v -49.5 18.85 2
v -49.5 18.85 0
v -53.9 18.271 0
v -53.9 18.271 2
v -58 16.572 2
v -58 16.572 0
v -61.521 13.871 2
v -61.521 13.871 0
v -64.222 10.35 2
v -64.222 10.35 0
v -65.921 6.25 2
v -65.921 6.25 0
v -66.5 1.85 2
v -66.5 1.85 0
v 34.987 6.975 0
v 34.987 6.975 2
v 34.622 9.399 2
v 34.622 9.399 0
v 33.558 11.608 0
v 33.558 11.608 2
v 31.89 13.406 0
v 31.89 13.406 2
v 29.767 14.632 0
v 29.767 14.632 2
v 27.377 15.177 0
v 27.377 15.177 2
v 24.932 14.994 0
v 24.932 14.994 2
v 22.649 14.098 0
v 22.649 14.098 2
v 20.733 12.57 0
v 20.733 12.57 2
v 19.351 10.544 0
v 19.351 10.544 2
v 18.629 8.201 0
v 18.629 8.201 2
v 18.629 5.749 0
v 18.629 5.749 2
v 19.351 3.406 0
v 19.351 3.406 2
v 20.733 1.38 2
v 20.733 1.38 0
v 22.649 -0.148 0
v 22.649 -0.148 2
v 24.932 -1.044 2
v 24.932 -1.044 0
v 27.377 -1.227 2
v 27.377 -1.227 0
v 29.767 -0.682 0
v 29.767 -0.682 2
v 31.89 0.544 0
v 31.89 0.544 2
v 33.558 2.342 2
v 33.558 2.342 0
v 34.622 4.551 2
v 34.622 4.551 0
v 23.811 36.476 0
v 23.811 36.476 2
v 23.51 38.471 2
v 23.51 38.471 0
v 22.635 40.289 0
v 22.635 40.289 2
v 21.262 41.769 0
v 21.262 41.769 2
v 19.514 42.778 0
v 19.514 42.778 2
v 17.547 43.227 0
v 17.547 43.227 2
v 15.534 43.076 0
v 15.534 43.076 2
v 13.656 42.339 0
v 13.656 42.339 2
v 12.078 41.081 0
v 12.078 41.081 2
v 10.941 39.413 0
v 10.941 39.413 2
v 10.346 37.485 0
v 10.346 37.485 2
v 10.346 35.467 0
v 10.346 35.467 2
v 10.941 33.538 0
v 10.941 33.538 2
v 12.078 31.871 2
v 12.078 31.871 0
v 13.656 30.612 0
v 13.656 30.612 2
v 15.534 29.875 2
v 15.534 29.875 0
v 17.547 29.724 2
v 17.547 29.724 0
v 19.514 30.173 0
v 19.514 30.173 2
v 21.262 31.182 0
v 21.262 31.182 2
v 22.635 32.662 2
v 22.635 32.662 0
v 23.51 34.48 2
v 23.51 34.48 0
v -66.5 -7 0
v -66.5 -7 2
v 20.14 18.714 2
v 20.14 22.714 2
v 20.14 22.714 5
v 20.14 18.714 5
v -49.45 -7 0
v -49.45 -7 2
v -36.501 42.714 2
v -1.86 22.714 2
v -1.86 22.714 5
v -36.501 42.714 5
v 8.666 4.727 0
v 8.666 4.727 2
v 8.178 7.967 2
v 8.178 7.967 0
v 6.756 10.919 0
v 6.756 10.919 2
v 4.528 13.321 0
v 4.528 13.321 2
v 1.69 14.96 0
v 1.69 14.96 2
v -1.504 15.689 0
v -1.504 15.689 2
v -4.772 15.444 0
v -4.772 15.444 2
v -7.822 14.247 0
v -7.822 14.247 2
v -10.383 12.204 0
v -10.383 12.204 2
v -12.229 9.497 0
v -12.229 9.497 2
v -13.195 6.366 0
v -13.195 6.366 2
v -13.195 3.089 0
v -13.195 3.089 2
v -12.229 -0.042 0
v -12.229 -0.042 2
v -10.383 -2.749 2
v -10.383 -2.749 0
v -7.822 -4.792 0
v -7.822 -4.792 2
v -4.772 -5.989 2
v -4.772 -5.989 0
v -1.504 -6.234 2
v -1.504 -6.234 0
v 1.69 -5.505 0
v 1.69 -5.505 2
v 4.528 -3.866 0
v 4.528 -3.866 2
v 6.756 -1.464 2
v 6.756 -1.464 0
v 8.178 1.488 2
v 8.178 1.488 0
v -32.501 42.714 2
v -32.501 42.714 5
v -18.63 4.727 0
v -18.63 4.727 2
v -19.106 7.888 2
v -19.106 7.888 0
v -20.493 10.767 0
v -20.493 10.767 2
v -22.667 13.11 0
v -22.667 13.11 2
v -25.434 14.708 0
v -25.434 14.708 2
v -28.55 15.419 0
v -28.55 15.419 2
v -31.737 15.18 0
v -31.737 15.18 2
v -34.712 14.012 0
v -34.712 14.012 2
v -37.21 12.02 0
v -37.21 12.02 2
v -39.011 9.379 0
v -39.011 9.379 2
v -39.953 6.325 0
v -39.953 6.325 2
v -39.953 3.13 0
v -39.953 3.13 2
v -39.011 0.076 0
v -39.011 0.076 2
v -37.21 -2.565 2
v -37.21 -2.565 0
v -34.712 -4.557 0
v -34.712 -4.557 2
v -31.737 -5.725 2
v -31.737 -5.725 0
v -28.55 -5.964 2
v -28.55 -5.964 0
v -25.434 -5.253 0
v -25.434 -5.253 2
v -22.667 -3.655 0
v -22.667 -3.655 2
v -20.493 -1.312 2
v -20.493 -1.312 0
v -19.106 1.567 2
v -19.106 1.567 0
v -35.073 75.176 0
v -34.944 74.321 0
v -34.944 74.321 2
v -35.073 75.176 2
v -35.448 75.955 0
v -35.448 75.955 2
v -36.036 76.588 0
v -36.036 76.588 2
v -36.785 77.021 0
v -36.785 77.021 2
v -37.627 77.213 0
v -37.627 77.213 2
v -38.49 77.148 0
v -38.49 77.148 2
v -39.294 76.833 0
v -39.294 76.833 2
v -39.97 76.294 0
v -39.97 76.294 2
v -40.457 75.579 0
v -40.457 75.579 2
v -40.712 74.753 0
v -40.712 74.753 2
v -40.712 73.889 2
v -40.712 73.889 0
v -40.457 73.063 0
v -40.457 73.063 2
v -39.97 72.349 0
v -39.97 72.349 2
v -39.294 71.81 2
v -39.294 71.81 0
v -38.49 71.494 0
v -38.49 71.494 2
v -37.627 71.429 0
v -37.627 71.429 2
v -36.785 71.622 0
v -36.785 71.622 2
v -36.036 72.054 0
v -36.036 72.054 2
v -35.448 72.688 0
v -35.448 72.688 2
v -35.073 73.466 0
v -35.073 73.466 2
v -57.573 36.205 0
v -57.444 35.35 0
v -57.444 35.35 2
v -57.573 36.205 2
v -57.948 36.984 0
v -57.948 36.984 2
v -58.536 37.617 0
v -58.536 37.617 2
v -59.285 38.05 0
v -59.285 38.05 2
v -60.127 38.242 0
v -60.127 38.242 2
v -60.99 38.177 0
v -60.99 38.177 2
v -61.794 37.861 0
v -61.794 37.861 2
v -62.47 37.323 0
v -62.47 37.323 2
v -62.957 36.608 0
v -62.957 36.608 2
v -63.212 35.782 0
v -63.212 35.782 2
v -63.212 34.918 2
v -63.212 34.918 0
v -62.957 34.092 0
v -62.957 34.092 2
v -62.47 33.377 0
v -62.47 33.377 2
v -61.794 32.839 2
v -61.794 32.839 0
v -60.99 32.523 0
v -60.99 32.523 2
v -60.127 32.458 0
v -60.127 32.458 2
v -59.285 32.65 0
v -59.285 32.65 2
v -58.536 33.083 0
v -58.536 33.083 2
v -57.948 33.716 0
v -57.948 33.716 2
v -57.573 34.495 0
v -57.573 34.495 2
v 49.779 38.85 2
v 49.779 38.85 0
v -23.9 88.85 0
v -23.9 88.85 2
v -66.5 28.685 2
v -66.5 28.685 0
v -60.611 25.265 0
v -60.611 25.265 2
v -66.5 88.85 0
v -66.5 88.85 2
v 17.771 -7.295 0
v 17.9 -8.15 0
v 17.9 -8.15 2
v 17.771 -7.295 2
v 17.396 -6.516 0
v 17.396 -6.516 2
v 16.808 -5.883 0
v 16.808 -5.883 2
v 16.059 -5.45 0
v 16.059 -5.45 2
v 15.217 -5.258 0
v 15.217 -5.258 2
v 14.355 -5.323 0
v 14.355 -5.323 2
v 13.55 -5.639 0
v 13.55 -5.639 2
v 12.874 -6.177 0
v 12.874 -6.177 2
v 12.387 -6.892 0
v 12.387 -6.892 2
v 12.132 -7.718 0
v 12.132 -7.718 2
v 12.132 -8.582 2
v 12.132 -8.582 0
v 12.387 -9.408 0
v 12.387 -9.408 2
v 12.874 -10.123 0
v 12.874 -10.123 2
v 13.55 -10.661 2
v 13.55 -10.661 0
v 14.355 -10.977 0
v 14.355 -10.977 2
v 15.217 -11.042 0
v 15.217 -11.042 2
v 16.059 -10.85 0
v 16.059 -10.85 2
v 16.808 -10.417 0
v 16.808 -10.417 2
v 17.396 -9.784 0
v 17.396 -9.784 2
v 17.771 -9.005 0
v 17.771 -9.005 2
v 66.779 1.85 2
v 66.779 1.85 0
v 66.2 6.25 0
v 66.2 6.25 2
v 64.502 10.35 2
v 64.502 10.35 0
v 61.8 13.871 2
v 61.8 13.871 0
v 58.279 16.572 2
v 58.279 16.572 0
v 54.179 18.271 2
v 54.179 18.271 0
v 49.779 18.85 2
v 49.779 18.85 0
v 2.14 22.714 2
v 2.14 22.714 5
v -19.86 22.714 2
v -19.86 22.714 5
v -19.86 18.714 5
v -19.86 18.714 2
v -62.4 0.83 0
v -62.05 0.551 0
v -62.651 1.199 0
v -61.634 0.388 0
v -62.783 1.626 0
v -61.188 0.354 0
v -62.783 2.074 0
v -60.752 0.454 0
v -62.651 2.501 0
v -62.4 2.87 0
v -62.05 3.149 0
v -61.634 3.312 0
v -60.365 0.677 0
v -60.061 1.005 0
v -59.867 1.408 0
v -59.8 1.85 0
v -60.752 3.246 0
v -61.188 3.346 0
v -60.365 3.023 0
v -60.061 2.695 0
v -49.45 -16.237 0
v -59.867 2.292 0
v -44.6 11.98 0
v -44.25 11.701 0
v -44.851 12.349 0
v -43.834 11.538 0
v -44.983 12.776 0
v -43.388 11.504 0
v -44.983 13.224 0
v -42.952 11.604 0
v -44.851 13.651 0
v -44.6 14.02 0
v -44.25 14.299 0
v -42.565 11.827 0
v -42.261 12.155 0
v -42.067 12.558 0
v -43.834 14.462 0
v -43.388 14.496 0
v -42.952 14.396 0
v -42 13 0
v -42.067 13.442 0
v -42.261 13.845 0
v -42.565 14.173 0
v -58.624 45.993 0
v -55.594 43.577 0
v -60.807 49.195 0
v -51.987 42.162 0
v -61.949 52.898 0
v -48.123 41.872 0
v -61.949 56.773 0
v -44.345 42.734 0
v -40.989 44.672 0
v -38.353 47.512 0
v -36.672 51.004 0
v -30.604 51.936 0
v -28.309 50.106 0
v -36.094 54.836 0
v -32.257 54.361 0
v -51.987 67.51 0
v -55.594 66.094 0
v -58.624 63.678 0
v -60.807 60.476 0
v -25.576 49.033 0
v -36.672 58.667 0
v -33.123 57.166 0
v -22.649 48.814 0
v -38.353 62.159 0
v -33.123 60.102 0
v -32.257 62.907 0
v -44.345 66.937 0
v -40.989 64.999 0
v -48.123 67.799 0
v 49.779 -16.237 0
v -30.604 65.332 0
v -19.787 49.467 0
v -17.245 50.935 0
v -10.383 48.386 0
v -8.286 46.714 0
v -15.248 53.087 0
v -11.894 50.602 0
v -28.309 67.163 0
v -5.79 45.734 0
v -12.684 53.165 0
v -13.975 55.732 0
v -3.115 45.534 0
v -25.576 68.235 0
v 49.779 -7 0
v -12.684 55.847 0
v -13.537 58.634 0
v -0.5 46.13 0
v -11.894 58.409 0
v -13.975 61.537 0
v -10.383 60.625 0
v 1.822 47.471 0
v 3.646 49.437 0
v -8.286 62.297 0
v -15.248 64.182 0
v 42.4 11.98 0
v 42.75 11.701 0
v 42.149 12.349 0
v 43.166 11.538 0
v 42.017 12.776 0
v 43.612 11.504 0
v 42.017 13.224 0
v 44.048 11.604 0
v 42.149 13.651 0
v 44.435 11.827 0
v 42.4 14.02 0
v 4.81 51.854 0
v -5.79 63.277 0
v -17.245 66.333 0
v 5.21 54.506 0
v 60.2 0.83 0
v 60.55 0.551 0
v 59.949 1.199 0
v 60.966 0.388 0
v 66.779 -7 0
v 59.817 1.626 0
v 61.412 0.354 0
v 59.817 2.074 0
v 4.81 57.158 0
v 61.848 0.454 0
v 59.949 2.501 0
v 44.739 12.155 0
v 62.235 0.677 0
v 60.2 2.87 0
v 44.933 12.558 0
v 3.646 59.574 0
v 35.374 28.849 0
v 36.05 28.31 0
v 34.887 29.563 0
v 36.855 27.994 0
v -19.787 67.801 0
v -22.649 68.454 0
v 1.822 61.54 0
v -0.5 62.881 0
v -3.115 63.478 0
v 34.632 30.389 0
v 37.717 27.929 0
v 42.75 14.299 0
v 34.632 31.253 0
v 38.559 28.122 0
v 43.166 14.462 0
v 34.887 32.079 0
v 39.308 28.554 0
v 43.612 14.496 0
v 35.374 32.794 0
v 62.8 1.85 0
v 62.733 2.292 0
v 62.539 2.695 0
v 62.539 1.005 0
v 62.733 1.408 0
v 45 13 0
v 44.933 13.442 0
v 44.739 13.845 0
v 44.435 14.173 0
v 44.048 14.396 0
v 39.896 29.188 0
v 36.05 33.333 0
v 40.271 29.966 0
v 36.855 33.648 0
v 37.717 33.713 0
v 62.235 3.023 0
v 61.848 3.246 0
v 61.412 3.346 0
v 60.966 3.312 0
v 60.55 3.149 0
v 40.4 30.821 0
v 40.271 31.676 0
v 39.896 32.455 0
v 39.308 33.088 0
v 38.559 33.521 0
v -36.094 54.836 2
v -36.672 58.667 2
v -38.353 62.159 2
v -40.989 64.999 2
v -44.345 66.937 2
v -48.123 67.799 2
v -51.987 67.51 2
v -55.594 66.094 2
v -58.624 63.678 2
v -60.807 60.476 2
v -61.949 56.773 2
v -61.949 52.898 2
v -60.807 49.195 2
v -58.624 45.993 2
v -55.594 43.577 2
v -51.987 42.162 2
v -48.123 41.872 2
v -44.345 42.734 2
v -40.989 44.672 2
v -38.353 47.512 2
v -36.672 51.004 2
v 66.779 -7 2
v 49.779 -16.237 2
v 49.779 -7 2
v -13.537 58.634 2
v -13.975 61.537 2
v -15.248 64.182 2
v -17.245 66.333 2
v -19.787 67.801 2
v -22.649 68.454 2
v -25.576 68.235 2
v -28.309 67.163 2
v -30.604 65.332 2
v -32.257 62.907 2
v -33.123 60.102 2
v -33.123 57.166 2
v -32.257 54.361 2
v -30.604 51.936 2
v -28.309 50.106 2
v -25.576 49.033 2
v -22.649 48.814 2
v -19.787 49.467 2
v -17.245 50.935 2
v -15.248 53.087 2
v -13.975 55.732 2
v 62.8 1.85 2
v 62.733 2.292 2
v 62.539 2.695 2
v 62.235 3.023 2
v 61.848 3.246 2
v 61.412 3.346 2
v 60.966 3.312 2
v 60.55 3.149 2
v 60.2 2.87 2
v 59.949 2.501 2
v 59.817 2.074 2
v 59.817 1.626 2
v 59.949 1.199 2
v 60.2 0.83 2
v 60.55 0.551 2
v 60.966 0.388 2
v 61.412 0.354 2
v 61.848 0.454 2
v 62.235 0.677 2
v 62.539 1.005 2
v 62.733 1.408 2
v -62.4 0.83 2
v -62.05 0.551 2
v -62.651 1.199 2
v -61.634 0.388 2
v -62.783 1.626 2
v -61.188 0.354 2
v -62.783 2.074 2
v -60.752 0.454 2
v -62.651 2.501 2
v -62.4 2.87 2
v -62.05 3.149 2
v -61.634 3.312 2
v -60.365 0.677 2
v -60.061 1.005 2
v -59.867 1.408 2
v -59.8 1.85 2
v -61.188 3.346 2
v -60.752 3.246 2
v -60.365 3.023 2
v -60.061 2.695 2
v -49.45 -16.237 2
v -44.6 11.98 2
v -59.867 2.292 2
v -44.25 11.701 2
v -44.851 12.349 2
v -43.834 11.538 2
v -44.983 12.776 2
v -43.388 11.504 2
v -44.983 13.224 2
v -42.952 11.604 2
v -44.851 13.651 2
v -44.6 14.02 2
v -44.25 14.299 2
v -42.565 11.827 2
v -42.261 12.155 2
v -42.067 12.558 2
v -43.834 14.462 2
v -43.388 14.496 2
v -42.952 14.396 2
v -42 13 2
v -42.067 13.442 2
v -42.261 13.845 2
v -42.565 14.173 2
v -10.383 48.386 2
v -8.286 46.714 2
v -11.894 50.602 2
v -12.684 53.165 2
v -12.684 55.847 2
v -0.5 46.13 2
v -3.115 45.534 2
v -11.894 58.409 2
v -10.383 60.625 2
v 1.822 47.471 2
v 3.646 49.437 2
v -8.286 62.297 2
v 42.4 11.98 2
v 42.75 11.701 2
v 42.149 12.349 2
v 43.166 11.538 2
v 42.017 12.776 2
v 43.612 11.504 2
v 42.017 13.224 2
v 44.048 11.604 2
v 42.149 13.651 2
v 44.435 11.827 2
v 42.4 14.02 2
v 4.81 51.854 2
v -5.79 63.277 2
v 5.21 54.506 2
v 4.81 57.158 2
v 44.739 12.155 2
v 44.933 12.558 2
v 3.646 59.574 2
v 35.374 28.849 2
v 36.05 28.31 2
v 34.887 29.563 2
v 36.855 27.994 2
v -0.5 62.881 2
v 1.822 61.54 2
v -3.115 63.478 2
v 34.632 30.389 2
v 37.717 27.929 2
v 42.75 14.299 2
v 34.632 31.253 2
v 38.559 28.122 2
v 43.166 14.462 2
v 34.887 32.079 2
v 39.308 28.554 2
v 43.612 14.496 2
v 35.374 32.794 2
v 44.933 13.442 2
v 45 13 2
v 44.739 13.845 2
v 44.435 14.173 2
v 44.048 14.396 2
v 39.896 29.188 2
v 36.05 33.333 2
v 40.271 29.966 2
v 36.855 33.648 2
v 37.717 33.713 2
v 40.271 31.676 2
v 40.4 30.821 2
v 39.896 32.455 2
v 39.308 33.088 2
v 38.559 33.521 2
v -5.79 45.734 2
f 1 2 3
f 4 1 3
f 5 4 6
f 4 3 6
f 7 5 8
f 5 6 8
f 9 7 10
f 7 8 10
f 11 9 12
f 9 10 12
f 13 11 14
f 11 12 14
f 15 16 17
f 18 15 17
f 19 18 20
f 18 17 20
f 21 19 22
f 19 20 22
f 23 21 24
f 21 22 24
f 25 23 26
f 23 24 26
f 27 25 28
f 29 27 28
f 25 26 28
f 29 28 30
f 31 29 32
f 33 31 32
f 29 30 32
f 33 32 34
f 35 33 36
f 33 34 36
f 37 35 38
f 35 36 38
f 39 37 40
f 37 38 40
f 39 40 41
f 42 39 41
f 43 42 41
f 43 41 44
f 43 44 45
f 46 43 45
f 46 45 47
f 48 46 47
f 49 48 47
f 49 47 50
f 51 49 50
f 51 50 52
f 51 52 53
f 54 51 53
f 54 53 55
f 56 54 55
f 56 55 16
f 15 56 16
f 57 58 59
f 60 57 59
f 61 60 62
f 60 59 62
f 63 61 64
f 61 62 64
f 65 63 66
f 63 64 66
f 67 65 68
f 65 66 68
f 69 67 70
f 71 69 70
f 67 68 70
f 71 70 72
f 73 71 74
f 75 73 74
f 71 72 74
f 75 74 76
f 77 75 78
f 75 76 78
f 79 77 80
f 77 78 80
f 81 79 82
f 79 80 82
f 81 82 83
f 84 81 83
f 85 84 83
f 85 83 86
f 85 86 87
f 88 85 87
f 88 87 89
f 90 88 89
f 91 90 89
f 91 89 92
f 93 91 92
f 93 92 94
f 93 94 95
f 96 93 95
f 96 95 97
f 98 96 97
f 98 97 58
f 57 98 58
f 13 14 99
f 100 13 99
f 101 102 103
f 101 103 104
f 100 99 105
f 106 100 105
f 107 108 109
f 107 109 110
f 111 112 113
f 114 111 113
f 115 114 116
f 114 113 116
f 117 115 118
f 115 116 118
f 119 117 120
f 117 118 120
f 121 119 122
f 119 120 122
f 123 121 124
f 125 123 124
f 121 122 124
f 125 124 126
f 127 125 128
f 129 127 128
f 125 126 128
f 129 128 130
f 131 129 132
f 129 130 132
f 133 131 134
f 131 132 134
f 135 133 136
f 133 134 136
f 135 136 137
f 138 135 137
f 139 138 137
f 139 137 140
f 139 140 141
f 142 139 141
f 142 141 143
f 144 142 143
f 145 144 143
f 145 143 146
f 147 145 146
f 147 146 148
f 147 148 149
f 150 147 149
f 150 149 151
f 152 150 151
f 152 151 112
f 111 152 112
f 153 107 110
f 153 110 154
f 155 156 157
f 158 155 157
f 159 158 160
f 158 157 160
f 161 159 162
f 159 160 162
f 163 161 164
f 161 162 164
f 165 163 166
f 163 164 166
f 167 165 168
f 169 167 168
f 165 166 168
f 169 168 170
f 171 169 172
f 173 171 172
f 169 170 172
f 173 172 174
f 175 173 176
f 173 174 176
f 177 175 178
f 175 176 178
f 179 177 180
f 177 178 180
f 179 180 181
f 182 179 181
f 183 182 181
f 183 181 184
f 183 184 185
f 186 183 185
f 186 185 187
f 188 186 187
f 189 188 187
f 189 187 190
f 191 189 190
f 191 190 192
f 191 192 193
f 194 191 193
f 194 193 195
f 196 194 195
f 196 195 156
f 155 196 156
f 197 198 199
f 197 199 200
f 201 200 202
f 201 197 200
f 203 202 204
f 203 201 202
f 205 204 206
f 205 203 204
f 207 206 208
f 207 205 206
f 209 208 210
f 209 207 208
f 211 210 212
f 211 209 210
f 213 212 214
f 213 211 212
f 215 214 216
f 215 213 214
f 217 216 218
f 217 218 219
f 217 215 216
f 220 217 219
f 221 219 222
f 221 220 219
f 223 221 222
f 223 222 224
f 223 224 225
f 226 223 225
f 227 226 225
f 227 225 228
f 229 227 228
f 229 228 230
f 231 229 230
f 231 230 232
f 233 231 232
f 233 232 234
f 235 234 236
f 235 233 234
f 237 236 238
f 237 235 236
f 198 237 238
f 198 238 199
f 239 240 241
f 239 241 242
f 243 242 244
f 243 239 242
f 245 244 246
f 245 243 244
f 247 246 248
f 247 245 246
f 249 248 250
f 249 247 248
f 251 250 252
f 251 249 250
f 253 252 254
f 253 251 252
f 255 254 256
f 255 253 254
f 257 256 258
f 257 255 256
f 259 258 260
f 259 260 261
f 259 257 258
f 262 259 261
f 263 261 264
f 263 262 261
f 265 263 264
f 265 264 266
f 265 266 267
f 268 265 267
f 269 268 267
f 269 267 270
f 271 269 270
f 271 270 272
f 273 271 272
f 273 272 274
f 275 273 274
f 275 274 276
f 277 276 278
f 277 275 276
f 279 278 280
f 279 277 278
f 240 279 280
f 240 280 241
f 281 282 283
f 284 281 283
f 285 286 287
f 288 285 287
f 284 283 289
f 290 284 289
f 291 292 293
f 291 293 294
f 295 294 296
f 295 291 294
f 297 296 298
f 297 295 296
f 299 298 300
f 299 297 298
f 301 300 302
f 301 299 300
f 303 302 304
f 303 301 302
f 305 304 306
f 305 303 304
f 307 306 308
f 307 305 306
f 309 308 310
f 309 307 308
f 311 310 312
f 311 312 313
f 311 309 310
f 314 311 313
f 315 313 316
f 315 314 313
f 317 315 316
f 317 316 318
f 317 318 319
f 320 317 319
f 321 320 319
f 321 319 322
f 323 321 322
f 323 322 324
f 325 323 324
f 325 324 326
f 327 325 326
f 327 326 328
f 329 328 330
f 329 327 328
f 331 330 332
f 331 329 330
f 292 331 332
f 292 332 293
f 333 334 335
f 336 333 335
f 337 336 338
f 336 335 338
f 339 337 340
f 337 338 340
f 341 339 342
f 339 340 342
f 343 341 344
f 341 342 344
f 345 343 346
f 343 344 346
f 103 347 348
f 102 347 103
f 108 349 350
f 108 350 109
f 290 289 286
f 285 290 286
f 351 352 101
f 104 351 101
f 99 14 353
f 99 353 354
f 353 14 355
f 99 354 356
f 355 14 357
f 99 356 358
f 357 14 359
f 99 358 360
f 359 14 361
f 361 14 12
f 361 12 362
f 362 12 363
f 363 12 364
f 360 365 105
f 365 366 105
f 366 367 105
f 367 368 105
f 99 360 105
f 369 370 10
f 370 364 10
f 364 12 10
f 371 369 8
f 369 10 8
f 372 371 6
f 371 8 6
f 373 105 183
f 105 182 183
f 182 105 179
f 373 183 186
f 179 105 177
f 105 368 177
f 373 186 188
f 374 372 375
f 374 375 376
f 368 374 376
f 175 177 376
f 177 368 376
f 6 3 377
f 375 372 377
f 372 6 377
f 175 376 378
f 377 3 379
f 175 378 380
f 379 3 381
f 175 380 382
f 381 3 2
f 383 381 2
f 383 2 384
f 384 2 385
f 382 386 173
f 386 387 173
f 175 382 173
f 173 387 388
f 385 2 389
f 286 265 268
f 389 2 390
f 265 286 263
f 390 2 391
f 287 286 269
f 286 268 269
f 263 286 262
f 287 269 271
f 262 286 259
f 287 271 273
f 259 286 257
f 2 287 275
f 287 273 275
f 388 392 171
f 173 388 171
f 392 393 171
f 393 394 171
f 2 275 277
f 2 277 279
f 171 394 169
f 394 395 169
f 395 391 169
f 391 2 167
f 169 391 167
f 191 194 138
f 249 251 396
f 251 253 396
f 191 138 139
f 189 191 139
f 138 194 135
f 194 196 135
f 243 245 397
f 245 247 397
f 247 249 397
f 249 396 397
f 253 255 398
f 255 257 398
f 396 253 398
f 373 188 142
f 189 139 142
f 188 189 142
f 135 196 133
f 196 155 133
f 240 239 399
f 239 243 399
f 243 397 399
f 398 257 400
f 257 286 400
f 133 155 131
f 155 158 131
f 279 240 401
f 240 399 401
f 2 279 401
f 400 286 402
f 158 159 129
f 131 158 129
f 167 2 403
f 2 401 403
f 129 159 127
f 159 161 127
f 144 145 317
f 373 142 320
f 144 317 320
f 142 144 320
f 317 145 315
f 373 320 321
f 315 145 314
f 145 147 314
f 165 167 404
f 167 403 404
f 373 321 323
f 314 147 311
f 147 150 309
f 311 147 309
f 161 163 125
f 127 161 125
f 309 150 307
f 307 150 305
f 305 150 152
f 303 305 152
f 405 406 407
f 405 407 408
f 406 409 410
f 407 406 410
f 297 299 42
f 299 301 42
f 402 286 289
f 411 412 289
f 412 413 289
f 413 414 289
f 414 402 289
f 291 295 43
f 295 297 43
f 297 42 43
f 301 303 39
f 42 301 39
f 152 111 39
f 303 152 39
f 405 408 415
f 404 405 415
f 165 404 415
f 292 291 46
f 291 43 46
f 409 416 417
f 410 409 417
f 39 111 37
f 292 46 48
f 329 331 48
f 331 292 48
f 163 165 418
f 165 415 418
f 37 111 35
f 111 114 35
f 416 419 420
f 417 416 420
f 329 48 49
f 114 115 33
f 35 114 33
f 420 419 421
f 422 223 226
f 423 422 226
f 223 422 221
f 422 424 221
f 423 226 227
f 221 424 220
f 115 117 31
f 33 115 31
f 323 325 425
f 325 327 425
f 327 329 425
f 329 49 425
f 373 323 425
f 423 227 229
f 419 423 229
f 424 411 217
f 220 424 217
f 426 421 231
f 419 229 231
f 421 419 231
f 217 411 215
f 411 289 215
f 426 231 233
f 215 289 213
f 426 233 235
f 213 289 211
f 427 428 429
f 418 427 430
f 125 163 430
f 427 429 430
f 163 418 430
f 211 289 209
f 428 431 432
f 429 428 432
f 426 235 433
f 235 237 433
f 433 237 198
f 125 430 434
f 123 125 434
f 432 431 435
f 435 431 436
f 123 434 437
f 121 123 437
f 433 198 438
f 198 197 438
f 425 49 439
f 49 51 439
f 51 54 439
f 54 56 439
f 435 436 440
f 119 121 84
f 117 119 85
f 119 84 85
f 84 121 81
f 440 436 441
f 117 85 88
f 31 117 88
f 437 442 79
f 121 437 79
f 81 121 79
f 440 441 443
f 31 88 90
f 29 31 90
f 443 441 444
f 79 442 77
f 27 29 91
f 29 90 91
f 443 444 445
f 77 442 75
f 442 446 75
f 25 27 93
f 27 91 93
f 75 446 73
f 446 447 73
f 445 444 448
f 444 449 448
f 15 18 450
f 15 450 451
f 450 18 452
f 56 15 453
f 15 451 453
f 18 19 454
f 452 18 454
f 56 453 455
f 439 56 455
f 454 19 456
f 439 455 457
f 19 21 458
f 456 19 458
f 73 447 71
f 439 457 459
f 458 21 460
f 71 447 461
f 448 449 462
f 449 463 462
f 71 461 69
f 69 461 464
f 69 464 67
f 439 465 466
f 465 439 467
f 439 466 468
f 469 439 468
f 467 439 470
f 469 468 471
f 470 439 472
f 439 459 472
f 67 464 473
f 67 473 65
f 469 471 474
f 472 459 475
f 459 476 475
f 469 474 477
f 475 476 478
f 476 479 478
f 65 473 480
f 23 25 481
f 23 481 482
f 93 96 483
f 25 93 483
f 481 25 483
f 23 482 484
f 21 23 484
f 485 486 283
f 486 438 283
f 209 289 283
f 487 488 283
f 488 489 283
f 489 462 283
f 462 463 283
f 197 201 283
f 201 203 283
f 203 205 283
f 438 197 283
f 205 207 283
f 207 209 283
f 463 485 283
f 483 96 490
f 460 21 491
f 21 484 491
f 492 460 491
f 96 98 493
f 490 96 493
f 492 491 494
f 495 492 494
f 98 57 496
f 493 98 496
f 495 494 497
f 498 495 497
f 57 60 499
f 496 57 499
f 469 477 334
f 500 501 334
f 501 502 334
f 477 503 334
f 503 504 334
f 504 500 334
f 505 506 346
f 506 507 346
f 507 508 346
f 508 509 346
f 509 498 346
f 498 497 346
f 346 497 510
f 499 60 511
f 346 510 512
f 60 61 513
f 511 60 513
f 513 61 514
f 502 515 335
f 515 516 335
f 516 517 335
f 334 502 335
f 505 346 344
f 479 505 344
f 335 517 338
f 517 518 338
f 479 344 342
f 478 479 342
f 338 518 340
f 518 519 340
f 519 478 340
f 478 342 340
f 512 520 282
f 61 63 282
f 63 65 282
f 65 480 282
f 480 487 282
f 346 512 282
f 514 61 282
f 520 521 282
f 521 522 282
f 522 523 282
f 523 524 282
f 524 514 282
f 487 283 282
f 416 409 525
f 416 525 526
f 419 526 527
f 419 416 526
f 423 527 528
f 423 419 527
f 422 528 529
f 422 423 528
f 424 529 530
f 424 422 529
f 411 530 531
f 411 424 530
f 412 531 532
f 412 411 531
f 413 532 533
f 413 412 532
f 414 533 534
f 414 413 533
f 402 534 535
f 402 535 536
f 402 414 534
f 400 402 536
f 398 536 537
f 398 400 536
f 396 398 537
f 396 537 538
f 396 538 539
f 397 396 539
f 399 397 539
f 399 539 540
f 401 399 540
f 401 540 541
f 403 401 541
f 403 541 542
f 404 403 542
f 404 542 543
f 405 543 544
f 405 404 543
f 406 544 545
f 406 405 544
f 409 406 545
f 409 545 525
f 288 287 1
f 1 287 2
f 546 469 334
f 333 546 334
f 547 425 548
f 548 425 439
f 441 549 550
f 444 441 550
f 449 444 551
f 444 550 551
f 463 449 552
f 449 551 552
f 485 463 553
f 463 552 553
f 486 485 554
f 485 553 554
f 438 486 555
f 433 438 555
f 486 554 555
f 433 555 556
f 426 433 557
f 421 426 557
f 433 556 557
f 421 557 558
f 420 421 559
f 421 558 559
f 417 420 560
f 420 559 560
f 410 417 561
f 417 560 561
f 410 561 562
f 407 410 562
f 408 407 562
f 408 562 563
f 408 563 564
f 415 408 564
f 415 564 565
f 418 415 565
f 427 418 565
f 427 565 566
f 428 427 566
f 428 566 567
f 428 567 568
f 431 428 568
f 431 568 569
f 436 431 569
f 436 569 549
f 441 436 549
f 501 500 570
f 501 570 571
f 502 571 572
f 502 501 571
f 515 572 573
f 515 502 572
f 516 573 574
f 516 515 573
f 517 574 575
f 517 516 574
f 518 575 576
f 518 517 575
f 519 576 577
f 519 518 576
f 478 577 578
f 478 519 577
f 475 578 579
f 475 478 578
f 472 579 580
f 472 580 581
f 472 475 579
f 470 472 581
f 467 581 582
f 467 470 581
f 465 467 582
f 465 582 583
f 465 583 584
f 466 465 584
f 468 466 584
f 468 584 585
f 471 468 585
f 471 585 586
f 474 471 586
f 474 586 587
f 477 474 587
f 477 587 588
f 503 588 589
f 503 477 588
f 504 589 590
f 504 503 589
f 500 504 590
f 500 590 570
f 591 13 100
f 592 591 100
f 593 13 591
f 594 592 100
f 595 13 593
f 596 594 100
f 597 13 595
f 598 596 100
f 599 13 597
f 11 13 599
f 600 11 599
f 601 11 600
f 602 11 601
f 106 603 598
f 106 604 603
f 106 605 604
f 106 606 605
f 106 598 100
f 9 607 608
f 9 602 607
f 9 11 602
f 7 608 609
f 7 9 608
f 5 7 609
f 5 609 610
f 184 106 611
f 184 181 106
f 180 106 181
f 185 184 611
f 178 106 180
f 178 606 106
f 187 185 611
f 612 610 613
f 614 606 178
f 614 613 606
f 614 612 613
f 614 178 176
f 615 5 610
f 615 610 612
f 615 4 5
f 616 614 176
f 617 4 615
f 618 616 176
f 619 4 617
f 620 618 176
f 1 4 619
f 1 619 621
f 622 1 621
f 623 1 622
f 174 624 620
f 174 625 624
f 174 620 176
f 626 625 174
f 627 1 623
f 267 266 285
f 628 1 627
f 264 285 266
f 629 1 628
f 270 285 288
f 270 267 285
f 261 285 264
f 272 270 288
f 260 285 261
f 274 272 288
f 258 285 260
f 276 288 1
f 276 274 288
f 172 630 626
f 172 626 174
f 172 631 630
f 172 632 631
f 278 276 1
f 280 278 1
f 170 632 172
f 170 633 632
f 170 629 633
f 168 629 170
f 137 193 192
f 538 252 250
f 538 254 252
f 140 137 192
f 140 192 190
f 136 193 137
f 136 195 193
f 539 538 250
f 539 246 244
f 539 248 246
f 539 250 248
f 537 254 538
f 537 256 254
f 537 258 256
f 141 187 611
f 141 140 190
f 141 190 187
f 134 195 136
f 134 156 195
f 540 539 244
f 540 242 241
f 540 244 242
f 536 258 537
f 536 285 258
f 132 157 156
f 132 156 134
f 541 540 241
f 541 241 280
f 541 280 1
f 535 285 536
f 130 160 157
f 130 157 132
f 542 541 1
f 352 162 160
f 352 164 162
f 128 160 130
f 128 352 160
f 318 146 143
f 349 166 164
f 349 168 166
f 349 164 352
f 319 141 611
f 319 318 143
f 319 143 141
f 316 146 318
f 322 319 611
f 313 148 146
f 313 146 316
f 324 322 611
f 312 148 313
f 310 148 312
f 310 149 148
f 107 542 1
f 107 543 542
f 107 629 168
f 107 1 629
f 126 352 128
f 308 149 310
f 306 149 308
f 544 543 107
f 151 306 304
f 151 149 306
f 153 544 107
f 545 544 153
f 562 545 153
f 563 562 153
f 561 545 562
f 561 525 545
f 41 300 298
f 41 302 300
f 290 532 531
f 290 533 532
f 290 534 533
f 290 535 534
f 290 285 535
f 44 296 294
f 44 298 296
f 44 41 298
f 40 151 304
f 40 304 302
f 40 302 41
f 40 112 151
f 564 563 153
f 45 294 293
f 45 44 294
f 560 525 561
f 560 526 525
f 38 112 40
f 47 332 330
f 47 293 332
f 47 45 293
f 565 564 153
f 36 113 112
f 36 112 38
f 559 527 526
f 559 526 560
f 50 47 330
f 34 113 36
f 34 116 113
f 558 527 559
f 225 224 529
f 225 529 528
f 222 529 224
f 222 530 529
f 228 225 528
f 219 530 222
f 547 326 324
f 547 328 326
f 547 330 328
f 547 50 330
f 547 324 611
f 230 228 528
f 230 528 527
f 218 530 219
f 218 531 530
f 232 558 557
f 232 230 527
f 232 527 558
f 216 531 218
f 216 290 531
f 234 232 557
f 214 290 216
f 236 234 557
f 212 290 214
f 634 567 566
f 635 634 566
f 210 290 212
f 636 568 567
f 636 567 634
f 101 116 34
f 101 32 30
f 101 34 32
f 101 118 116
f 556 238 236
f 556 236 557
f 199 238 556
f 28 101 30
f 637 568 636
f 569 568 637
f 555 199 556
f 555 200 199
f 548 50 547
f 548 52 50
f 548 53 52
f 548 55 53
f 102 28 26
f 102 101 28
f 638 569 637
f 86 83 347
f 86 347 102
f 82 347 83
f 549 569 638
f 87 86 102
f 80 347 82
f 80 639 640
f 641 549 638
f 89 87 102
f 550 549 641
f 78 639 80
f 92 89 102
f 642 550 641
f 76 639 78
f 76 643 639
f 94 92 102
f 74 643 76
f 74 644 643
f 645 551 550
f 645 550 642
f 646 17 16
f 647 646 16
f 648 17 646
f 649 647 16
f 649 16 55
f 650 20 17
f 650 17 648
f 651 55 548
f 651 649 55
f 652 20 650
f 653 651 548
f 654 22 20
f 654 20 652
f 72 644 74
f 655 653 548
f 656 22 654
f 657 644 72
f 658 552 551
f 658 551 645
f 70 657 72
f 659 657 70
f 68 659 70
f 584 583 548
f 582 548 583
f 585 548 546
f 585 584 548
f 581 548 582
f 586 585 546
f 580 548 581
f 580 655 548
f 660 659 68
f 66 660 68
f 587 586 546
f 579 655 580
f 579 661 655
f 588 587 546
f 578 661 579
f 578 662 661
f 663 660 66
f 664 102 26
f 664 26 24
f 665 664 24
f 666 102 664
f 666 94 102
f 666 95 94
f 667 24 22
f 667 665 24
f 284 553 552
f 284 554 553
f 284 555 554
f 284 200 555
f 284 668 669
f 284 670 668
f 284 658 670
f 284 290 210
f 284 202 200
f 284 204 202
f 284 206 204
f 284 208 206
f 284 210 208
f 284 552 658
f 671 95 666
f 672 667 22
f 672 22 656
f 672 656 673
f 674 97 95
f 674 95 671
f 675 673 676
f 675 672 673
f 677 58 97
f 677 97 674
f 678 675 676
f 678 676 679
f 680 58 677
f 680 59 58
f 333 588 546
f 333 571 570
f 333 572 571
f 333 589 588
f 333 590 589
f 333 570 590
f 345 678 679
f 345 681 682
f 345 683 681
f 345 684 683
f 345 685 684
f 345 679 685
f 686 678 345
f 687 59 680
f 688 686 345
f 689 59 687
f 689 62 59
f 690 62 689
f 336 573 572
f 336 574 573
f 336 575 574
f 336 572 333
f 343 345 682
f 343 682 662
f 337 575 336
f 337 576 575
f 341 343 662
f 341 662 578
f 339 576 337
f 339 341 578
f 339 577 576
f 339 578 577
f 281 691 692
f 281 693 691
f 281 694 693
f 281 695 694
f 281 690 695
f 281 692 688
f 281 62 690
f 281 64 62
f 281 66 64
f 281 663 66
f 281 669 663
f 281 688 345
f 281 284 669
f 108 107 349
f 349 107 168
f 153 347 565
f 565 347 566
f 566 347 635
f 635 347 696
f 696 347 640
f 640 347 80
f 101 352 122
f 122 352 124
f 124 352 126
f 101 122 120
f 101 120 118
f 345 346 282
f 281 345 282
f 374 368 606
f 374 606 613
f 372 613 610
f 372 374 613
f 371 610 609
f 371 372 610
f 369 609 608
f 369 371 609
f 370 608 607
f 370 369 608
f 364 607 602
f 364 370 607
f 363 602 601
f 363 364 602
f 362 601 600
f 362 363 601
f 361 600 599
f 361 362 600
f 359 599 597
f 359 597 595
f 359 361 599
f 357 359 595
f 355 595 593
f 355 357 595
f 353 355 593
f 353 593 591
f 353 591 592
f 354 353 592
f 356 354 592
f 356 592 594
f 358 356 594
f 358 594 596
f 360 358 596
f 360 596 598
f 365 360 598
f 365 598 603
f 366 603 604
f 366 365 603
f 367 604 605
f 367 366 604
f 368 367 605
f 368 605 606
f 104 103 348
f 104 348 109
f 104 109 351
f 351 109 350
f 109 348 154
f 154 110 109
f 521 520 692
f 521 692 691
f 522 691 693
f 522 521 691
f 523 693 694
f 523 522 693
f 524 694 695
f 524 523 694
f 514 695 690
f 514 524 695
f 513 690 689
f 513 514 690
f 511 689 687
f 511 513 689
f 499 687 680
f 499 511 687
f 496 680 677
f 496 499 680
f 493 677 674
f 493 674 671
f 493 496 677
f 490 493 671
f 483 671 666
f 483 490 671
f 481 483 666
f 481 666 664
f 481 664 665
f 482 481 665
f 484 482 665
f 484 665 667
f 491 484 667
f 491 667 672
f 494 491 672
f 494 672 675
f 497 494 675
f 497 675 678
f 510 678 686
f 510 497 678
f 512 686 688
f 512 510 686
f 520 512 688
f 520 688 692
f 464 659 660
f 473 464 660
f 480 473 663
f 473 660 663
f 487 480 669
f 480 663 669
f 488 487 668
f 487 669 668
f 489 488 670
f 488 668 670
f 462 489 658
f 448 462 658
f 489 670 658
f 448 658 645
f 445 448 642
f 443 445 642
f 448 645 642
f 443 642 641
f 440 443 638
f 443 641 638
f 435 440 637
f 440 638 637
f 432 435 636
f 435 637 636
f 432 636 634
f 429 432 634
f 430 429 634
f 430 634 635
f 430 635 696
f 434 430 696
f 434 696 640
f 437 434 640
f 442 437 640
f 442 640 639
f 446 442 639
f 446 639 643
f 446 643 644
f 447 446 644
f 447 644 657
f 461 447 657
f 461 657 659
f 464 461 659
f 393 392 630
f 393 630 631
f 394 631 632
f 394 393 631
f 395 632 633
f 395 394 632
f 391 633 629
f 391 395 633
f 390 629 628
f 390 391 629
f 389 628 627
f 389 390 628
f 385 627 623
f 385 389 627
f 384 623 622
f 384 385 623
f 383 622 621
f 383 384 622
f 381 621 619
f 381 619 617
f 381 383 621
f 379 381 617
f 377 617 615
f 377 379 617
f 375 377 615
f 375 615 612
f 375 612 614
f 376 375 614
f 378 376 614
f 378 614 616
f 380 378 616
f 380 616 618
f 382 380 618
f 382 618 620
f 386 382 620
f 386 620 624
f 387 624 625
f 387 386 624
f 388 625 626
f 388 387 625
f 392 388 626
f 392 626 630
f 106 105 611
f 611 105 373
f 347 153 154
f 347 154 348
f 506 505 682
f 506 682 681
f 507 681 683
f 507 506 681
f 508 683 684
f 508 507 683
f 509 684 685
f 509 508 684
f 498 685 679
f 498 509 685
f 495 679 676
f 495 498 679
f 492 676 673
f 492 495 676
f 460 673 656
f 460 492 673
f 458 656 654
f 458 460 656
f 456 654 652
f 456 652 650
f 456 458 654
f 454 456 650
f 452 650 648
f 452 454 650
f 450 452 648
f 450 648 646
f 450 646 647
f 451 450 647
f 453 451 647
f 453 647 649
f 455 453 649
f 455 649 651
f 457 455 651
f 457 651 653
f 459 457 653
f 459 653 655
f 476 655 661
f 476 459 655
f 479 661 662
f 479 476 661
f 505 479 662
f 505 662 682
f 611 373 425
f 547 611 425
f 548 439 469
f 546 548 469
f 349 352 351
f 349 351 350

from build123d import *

# Parameters (mm, degrees)
SKETCH_1_R          = 1.5
SKETCH_1_R_2        = 2.9
SKETCH_1_R_3        = 13
EXTRUDE_2_DEPTH     = 2
EXTRUDE_3_DEPTH     = 3
SKETCH_3_R          = 9.847727686
SKETCH_3_R_2        = 8.997097943
SKETCH_3_R_3        = 10.721268195
SKETCH_3_R_4        = 10.991913459
SKETCH_3_R_5        = 8.225176043
SKETCH_3_R_6        = 6.770172336
CUT_EXTRUDE_1_DEPTH = 3


with BuildPart() as part:
    # 草图1 → 凸台-拉伸2 (new body)
    with BuildSketch(Plane.XY):
        with BuildLine():
            Line((49.779367134, 18.85), (49.779367134, 38.85))
            Line((49.779367134, 38.85), (-23.899828069, 88.85))
            Line((-23.899828069, 88.85), (-66.5, 88.85))
            Line((-66.5, 88.85), (-66.5, 28.68453606))
            Line((-66.5, 28.68453606), (-60.610760184, 25.264800383))
            Line((-60.610760184, 25.264800383), (-49.5, 18.85))
            ThreePointArc((-49.5, 18.85), (-61.52081528, 13.87081528), (-66.5, 1.85))
            Line((-66.5, 1.85), (-66.5, -7))
            Line((-66.5, -7), (-49.450486279, -7))
            Line((-49.450486279, -7), (-49.450486279, -16.236884808))
            Line((-49.450486279, -16.236884808), (49.779367134, -16.236884808))
            Line((49.779367134, -16.236884808), (49.779367134, -7))
            Line((49.779367134, -7), (66.779367134, -7))
            Line((66.779367134, -7), (66.779367134, 1.85))
            ThreePointArc((66.779367134, 1.85), (61.800182415, 13.87081528), (49.779367134, 18.85))
        make_face()
        with Locations((-61.3, 1.85)):
            Circle(SKETCH_1_R, mode=Mode.SUBTRACT)
        with Locations((-43.5, 13)):
            Circle(SKETCH_1_R, mode=Mode.SUBTRACT)
        with Locations((15, -8.15)):
            Circle(SKETCH_1_R_2, mode=Mode.SUBTRACT)
        with Locations((37.5, 30.82114317)):
            Circle(SKETCH_1_R_2, mode=Mode.SUBTRACT)
        with Locations((-60.344210129, 35.35)):
            Circle(SKETCH_1_R_2, mode=Mode.SUBTRACT)
        with Locations((-37.844210129, 74.32114317)):
            Circle(SKETCH_1_R_2, mode=Mode.SUBTRACT)
        with Locations((43.5, 13)):
            Circle(SKETCH_1_R, mode=Mode.SUBTRACT)
        with Locations((61.3, 1.85)):
            Circle(SKETCH_1_R, mode=Mode.SUBTRACT)
        with Locations((-49.094210129, 54.835571585)):
            Circle(SKETCH_1_R_3, mode=Mode.SUBTRACT)
    extrude(amount=EXTRUDE_2_DEPTH)

    # 草图2 → 凸台-拉伸3 (add)
    with BuildSketch(Plane.XY.offset(2)):
        Polygon((-1.860316433, 22.713601471), (-36.501332584, 42.713601471), (-32.501332584, 42.713601471), (2.139683567, 22.713601471), (20.139683567, 22.713601471), (20.139683567, 18.713601471), (2.139683567, 18.713601471), (-1.860316433, 18.713601471), (-19.860316433, 18.713601471), (-19.860316433, 22.713601471), align=None)
    extrude(amount=EXTRUDE_3_DEPTH)

    # 草图3 → 切除-拉伸1 (cut, through all)
    with BuildSketch(Plane.XY.offset(2)):
        with Locations((-23.384871699, 58.634182407)):
            Circle(SKETCH_3_R)
        with Locations((-3.787476222, 54.505622136)):
            Circle(SKETCH_3_R_2)
        with Locations((-29.351202297, 4.727480211)):
            Circle(SKETCH_3_R_3)
        with Locations((-2.325708947, 4.727480211)):
            Circle(SKETCH_3_R_4)
        with Locations((26.76200458, 6.974994395)):
            Circle(SKETCH_3_R_5)
        with Locations((17.040896101, 36.475624713)):
            Circle(SKETCH_3_R_6)
    extrude(amount=-CUT_EXTRUDE_1_DEPTH, mode=Mode.SUBTRACT)


solid = part.part
